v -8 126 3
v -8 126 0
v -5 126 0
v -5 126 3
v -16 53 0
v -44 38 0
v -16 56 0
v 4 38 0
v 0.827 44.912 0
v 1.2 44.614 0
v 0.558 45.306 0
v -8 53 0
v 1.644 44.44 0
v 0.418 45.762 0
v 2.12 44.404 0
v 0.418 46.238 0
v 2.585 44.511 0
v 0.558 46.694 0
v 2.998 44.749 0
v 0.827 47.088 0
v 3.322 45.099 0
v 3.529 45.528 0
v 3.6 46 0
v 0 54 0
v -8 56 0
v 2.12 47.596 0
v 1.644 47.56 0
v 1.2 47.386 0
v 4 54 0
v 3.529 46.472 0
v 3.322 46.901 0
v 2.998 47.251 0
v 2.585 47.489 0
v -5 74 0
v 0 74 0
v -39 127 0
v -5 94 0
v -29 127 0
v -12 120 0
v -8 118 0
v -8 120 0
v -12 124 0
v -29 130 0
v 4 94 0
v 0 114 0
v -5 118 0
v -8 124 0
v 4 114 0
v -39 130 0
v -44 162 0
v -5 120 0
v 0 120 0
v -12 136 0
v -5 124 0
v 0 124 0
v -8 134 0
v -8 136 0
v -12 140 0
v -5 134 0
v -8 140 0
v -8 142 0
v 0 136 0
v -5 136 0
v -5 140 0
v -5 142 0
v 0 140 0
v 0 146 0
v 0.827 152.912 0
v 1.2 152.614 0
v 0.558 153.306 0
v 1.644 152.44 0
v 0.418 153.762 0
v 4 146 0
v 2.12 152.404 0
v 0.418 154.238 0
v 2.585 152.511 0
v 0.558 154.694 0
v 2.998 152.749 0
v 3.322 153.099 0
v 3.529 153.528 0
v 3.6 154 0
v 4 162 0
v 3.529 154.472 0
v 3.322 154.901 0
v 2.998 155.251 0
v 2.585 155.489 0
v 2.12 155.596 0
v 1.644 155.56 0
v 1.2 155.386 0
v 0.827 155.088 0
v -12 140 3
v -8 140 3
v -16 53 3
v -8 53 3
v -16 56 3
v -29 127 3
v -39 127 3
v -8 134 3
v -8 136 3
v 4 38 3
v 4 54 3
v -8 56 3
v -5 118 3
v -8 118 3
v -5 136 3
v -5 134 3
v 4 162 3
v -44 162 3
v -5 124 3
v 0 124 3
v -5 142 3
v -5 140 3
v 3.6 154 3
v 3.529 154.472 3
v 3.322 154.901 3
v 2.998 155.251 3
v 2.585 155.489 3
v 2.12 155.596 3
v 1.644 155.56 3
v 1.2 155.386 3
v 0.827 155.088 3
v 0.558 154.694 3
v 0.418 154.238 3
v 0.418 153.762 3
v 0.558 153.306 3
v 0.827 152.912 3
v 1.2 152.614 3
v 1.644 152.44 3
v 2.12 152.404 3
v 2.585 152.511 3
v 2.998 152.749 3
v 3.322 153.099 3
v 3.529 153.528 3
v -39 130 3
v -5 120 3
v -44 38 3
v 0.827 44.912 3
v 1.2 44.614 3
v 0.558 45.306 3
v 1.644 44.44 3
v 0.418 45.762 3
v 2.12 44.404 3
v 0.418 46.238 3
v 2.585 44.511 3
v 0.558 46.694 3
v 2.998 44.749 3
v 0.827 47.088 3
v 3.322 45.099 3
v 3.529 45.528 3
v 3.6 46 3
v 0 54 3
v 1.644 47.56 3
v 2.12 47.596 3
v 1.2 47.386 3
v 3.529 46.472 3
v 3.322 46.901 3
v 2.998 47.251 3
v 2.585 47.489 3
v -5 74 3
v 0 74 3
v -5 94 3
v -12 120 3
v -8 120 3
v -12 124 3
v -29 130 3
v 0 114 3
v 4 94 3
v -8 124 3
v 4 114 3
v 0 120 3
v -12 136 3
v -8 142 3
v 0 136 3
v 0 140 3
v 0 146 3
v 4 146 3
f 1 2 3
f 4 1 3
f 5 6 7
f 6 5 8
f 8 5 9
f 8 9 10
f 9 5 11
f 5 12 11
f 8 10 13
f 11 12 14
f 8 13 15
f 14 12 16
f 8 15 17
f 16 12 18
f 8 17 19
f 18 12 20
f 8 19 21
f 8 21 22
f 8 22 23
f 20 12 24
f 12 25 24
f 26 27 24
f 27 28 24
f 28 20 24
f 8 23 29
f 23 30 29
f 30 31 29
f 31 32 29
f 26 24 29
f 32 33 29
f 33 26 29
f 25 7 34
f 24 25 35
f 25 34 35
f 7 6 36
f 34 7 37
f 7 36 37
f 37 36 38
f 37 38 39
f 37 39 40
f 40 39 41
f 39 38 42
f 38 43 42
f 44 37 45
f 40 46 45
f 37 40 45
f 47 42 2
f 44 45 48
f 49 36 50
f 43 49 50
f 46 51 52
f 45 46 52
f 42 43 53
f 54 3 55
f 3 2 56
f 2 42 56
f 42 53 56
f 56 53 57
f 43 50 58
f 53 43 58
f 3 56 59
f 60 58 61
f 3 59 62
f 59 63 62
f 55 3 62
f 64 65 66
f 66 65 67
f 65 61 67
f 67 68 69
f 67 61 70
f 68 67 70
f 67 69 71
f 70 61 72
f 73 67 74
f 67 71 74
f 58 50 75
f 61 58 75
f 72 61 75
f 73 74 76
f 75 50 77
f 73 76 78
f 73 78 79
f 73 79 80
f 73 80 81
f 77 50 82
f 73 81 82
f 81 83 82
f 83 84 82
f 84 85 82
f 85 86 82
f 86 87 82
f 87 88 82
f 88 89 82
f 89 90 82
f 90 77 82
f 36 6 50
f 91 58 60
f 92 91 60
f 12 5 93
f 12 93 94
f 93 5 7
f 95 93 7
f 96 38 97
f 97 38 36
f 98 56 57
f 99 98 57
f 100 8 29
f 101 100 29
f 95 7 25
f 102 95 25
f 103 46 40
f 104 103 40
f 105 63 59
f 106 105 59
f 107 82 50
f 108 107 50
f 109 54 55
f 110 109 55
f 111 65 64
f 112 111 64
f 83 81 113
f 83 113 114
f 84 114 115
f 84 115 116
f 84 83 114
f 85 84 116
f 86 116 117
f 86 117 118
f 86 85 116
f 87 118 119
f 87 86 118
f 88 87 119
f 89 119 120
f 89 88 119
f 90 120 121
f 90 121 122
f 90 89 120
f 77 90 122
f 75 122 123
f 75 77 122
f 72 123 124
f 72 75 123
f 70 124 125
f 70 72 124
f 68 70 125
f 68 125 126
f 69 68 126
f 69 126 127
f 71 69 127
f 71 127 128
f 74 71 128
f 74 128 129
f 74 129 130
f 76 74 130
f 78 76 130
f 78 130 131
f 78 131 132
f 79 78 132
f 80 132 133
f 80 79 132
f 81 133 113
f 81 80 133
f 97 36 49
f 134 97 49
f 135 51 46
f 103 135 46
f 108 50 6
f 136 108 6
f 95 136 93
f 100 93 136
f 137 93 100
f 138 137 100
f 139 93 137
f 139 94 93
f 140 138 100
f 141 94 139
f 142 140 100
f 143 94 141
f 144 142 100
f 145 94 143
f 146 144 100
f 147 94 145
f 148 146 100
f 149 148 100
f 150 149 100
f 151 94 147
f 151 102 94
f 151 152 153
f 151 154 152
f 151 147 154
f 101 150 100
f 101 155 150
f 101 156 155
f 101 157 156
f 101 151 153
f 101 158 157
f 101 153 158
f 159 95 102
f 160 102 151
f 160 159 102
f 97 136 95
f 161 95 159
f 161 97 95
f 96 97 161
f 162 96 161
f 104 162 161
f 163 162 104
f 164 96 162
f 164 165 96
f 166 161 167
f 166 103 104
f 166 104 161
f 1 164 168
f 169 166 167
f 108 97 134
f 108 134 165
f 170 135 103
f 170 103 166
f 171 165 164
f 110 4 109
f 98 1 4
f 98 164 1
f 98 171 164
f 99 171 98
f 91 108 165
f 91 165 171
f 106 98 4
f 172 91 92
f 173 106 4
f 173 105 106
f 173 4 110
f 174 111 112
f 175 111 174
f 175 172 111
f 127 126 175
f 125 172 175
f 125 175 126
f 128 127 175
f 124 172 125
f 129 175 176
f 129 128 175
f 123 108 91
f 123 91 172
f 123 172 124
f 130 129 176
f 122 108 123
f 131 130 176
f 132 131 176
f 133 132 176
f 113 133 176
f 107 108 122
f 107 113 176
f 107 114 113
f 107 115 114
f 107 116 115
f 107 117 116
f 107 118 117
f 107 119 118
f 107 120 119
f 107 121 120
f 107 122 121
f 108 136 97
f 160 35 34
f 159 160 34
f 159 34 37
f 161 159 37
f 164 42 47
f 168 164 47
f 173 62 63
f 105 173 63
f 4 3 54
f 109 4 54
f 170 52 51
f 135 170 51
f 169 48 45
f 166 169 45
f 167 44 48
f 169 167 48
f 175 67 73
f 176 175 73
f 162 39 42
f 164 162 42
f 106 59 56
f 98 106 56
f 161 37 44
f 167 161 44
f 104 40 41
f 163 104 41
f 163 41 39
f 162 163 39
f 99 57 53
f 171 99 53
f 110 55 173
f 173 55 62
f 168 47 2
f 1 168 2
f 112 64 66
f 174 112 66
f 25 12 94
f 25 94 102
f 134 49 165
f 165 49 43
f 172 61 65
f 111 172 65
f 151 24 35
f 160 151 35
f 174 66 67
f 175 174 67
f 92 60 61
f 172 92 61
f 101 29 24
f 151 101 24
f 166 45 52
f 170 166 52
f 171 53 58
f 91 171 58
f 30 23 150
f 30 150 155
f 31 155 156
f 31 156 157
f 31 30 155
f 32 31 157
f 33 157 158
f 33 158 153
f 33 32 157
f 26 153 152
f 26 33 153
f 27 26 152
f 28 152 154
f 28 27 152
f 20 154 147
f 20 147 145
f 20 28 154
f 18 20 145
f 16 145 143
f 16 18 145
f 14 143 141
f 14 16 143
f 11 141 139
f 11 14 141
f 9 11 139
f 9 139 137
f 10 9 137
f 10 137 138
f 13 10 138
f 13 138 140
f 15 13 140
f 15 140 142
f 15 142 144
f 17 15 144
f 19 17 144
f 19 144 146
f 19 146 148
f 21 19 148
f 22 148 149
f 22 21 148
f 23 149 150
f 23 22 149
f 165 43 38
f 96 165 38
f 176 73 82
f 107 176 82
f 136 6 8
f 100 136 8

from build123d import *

# Parameters (mm, degrees)
SKETCH_1_W      = 8
SKETCH_1_H      = 3
SKETCH_1_R      = 1.6
EXTRUDE_1_DEPTH = 3


with BuildPart() as part:
    # 草图1 → 凸台-拉伸1 (new body)
    with BuildSketch(Plane.XY):
        Polygon((0, 140), (0, 146), (4, 146), (4, 162), (0, 162), (-44, 162), (-44, 38), (4, 38), (4, 54), (0, 54), (0, 74), (-5, 74), (-5, 94), (4, 94), (4, 114), (0, 114), (0, 120), (-5, 120), (-5, 118), (-8, 118), (-8, 120), (-12, 120), (-12, 124), (-8, 124), (-8, 126), (-5, 126), (-5, 124), (0, 124), (0, 136), (-5, 136), (-5, 134), (-8, 134), (-8, 136), (-12, 136), (-12, 140), (-8, 140), (-8, 142), (-5, 142), (-5, 140), align=None)
        with Locations((-12, 54.5)):
            Rectangle(SKETCH_1_W, SKETCH_1_H, mode=Mode.SUBTRACT)
        with Locations((2, 46)):
            Circle(SKETCH_1_R, mode=Mode.SUBTRACT)
        Polygon((-39, 130), (-32, 130), (-29, 130), (-29, 127), (-39, 127), align=None, mode=Mode.SUBTRACT)
        with Locations((2, 154)):
            Circle(SKETCH_1_R, mode=Mode.SUBTRACT)
    extrude(amount=EXTRUDE_1_DEPTH)


solid = part.part
